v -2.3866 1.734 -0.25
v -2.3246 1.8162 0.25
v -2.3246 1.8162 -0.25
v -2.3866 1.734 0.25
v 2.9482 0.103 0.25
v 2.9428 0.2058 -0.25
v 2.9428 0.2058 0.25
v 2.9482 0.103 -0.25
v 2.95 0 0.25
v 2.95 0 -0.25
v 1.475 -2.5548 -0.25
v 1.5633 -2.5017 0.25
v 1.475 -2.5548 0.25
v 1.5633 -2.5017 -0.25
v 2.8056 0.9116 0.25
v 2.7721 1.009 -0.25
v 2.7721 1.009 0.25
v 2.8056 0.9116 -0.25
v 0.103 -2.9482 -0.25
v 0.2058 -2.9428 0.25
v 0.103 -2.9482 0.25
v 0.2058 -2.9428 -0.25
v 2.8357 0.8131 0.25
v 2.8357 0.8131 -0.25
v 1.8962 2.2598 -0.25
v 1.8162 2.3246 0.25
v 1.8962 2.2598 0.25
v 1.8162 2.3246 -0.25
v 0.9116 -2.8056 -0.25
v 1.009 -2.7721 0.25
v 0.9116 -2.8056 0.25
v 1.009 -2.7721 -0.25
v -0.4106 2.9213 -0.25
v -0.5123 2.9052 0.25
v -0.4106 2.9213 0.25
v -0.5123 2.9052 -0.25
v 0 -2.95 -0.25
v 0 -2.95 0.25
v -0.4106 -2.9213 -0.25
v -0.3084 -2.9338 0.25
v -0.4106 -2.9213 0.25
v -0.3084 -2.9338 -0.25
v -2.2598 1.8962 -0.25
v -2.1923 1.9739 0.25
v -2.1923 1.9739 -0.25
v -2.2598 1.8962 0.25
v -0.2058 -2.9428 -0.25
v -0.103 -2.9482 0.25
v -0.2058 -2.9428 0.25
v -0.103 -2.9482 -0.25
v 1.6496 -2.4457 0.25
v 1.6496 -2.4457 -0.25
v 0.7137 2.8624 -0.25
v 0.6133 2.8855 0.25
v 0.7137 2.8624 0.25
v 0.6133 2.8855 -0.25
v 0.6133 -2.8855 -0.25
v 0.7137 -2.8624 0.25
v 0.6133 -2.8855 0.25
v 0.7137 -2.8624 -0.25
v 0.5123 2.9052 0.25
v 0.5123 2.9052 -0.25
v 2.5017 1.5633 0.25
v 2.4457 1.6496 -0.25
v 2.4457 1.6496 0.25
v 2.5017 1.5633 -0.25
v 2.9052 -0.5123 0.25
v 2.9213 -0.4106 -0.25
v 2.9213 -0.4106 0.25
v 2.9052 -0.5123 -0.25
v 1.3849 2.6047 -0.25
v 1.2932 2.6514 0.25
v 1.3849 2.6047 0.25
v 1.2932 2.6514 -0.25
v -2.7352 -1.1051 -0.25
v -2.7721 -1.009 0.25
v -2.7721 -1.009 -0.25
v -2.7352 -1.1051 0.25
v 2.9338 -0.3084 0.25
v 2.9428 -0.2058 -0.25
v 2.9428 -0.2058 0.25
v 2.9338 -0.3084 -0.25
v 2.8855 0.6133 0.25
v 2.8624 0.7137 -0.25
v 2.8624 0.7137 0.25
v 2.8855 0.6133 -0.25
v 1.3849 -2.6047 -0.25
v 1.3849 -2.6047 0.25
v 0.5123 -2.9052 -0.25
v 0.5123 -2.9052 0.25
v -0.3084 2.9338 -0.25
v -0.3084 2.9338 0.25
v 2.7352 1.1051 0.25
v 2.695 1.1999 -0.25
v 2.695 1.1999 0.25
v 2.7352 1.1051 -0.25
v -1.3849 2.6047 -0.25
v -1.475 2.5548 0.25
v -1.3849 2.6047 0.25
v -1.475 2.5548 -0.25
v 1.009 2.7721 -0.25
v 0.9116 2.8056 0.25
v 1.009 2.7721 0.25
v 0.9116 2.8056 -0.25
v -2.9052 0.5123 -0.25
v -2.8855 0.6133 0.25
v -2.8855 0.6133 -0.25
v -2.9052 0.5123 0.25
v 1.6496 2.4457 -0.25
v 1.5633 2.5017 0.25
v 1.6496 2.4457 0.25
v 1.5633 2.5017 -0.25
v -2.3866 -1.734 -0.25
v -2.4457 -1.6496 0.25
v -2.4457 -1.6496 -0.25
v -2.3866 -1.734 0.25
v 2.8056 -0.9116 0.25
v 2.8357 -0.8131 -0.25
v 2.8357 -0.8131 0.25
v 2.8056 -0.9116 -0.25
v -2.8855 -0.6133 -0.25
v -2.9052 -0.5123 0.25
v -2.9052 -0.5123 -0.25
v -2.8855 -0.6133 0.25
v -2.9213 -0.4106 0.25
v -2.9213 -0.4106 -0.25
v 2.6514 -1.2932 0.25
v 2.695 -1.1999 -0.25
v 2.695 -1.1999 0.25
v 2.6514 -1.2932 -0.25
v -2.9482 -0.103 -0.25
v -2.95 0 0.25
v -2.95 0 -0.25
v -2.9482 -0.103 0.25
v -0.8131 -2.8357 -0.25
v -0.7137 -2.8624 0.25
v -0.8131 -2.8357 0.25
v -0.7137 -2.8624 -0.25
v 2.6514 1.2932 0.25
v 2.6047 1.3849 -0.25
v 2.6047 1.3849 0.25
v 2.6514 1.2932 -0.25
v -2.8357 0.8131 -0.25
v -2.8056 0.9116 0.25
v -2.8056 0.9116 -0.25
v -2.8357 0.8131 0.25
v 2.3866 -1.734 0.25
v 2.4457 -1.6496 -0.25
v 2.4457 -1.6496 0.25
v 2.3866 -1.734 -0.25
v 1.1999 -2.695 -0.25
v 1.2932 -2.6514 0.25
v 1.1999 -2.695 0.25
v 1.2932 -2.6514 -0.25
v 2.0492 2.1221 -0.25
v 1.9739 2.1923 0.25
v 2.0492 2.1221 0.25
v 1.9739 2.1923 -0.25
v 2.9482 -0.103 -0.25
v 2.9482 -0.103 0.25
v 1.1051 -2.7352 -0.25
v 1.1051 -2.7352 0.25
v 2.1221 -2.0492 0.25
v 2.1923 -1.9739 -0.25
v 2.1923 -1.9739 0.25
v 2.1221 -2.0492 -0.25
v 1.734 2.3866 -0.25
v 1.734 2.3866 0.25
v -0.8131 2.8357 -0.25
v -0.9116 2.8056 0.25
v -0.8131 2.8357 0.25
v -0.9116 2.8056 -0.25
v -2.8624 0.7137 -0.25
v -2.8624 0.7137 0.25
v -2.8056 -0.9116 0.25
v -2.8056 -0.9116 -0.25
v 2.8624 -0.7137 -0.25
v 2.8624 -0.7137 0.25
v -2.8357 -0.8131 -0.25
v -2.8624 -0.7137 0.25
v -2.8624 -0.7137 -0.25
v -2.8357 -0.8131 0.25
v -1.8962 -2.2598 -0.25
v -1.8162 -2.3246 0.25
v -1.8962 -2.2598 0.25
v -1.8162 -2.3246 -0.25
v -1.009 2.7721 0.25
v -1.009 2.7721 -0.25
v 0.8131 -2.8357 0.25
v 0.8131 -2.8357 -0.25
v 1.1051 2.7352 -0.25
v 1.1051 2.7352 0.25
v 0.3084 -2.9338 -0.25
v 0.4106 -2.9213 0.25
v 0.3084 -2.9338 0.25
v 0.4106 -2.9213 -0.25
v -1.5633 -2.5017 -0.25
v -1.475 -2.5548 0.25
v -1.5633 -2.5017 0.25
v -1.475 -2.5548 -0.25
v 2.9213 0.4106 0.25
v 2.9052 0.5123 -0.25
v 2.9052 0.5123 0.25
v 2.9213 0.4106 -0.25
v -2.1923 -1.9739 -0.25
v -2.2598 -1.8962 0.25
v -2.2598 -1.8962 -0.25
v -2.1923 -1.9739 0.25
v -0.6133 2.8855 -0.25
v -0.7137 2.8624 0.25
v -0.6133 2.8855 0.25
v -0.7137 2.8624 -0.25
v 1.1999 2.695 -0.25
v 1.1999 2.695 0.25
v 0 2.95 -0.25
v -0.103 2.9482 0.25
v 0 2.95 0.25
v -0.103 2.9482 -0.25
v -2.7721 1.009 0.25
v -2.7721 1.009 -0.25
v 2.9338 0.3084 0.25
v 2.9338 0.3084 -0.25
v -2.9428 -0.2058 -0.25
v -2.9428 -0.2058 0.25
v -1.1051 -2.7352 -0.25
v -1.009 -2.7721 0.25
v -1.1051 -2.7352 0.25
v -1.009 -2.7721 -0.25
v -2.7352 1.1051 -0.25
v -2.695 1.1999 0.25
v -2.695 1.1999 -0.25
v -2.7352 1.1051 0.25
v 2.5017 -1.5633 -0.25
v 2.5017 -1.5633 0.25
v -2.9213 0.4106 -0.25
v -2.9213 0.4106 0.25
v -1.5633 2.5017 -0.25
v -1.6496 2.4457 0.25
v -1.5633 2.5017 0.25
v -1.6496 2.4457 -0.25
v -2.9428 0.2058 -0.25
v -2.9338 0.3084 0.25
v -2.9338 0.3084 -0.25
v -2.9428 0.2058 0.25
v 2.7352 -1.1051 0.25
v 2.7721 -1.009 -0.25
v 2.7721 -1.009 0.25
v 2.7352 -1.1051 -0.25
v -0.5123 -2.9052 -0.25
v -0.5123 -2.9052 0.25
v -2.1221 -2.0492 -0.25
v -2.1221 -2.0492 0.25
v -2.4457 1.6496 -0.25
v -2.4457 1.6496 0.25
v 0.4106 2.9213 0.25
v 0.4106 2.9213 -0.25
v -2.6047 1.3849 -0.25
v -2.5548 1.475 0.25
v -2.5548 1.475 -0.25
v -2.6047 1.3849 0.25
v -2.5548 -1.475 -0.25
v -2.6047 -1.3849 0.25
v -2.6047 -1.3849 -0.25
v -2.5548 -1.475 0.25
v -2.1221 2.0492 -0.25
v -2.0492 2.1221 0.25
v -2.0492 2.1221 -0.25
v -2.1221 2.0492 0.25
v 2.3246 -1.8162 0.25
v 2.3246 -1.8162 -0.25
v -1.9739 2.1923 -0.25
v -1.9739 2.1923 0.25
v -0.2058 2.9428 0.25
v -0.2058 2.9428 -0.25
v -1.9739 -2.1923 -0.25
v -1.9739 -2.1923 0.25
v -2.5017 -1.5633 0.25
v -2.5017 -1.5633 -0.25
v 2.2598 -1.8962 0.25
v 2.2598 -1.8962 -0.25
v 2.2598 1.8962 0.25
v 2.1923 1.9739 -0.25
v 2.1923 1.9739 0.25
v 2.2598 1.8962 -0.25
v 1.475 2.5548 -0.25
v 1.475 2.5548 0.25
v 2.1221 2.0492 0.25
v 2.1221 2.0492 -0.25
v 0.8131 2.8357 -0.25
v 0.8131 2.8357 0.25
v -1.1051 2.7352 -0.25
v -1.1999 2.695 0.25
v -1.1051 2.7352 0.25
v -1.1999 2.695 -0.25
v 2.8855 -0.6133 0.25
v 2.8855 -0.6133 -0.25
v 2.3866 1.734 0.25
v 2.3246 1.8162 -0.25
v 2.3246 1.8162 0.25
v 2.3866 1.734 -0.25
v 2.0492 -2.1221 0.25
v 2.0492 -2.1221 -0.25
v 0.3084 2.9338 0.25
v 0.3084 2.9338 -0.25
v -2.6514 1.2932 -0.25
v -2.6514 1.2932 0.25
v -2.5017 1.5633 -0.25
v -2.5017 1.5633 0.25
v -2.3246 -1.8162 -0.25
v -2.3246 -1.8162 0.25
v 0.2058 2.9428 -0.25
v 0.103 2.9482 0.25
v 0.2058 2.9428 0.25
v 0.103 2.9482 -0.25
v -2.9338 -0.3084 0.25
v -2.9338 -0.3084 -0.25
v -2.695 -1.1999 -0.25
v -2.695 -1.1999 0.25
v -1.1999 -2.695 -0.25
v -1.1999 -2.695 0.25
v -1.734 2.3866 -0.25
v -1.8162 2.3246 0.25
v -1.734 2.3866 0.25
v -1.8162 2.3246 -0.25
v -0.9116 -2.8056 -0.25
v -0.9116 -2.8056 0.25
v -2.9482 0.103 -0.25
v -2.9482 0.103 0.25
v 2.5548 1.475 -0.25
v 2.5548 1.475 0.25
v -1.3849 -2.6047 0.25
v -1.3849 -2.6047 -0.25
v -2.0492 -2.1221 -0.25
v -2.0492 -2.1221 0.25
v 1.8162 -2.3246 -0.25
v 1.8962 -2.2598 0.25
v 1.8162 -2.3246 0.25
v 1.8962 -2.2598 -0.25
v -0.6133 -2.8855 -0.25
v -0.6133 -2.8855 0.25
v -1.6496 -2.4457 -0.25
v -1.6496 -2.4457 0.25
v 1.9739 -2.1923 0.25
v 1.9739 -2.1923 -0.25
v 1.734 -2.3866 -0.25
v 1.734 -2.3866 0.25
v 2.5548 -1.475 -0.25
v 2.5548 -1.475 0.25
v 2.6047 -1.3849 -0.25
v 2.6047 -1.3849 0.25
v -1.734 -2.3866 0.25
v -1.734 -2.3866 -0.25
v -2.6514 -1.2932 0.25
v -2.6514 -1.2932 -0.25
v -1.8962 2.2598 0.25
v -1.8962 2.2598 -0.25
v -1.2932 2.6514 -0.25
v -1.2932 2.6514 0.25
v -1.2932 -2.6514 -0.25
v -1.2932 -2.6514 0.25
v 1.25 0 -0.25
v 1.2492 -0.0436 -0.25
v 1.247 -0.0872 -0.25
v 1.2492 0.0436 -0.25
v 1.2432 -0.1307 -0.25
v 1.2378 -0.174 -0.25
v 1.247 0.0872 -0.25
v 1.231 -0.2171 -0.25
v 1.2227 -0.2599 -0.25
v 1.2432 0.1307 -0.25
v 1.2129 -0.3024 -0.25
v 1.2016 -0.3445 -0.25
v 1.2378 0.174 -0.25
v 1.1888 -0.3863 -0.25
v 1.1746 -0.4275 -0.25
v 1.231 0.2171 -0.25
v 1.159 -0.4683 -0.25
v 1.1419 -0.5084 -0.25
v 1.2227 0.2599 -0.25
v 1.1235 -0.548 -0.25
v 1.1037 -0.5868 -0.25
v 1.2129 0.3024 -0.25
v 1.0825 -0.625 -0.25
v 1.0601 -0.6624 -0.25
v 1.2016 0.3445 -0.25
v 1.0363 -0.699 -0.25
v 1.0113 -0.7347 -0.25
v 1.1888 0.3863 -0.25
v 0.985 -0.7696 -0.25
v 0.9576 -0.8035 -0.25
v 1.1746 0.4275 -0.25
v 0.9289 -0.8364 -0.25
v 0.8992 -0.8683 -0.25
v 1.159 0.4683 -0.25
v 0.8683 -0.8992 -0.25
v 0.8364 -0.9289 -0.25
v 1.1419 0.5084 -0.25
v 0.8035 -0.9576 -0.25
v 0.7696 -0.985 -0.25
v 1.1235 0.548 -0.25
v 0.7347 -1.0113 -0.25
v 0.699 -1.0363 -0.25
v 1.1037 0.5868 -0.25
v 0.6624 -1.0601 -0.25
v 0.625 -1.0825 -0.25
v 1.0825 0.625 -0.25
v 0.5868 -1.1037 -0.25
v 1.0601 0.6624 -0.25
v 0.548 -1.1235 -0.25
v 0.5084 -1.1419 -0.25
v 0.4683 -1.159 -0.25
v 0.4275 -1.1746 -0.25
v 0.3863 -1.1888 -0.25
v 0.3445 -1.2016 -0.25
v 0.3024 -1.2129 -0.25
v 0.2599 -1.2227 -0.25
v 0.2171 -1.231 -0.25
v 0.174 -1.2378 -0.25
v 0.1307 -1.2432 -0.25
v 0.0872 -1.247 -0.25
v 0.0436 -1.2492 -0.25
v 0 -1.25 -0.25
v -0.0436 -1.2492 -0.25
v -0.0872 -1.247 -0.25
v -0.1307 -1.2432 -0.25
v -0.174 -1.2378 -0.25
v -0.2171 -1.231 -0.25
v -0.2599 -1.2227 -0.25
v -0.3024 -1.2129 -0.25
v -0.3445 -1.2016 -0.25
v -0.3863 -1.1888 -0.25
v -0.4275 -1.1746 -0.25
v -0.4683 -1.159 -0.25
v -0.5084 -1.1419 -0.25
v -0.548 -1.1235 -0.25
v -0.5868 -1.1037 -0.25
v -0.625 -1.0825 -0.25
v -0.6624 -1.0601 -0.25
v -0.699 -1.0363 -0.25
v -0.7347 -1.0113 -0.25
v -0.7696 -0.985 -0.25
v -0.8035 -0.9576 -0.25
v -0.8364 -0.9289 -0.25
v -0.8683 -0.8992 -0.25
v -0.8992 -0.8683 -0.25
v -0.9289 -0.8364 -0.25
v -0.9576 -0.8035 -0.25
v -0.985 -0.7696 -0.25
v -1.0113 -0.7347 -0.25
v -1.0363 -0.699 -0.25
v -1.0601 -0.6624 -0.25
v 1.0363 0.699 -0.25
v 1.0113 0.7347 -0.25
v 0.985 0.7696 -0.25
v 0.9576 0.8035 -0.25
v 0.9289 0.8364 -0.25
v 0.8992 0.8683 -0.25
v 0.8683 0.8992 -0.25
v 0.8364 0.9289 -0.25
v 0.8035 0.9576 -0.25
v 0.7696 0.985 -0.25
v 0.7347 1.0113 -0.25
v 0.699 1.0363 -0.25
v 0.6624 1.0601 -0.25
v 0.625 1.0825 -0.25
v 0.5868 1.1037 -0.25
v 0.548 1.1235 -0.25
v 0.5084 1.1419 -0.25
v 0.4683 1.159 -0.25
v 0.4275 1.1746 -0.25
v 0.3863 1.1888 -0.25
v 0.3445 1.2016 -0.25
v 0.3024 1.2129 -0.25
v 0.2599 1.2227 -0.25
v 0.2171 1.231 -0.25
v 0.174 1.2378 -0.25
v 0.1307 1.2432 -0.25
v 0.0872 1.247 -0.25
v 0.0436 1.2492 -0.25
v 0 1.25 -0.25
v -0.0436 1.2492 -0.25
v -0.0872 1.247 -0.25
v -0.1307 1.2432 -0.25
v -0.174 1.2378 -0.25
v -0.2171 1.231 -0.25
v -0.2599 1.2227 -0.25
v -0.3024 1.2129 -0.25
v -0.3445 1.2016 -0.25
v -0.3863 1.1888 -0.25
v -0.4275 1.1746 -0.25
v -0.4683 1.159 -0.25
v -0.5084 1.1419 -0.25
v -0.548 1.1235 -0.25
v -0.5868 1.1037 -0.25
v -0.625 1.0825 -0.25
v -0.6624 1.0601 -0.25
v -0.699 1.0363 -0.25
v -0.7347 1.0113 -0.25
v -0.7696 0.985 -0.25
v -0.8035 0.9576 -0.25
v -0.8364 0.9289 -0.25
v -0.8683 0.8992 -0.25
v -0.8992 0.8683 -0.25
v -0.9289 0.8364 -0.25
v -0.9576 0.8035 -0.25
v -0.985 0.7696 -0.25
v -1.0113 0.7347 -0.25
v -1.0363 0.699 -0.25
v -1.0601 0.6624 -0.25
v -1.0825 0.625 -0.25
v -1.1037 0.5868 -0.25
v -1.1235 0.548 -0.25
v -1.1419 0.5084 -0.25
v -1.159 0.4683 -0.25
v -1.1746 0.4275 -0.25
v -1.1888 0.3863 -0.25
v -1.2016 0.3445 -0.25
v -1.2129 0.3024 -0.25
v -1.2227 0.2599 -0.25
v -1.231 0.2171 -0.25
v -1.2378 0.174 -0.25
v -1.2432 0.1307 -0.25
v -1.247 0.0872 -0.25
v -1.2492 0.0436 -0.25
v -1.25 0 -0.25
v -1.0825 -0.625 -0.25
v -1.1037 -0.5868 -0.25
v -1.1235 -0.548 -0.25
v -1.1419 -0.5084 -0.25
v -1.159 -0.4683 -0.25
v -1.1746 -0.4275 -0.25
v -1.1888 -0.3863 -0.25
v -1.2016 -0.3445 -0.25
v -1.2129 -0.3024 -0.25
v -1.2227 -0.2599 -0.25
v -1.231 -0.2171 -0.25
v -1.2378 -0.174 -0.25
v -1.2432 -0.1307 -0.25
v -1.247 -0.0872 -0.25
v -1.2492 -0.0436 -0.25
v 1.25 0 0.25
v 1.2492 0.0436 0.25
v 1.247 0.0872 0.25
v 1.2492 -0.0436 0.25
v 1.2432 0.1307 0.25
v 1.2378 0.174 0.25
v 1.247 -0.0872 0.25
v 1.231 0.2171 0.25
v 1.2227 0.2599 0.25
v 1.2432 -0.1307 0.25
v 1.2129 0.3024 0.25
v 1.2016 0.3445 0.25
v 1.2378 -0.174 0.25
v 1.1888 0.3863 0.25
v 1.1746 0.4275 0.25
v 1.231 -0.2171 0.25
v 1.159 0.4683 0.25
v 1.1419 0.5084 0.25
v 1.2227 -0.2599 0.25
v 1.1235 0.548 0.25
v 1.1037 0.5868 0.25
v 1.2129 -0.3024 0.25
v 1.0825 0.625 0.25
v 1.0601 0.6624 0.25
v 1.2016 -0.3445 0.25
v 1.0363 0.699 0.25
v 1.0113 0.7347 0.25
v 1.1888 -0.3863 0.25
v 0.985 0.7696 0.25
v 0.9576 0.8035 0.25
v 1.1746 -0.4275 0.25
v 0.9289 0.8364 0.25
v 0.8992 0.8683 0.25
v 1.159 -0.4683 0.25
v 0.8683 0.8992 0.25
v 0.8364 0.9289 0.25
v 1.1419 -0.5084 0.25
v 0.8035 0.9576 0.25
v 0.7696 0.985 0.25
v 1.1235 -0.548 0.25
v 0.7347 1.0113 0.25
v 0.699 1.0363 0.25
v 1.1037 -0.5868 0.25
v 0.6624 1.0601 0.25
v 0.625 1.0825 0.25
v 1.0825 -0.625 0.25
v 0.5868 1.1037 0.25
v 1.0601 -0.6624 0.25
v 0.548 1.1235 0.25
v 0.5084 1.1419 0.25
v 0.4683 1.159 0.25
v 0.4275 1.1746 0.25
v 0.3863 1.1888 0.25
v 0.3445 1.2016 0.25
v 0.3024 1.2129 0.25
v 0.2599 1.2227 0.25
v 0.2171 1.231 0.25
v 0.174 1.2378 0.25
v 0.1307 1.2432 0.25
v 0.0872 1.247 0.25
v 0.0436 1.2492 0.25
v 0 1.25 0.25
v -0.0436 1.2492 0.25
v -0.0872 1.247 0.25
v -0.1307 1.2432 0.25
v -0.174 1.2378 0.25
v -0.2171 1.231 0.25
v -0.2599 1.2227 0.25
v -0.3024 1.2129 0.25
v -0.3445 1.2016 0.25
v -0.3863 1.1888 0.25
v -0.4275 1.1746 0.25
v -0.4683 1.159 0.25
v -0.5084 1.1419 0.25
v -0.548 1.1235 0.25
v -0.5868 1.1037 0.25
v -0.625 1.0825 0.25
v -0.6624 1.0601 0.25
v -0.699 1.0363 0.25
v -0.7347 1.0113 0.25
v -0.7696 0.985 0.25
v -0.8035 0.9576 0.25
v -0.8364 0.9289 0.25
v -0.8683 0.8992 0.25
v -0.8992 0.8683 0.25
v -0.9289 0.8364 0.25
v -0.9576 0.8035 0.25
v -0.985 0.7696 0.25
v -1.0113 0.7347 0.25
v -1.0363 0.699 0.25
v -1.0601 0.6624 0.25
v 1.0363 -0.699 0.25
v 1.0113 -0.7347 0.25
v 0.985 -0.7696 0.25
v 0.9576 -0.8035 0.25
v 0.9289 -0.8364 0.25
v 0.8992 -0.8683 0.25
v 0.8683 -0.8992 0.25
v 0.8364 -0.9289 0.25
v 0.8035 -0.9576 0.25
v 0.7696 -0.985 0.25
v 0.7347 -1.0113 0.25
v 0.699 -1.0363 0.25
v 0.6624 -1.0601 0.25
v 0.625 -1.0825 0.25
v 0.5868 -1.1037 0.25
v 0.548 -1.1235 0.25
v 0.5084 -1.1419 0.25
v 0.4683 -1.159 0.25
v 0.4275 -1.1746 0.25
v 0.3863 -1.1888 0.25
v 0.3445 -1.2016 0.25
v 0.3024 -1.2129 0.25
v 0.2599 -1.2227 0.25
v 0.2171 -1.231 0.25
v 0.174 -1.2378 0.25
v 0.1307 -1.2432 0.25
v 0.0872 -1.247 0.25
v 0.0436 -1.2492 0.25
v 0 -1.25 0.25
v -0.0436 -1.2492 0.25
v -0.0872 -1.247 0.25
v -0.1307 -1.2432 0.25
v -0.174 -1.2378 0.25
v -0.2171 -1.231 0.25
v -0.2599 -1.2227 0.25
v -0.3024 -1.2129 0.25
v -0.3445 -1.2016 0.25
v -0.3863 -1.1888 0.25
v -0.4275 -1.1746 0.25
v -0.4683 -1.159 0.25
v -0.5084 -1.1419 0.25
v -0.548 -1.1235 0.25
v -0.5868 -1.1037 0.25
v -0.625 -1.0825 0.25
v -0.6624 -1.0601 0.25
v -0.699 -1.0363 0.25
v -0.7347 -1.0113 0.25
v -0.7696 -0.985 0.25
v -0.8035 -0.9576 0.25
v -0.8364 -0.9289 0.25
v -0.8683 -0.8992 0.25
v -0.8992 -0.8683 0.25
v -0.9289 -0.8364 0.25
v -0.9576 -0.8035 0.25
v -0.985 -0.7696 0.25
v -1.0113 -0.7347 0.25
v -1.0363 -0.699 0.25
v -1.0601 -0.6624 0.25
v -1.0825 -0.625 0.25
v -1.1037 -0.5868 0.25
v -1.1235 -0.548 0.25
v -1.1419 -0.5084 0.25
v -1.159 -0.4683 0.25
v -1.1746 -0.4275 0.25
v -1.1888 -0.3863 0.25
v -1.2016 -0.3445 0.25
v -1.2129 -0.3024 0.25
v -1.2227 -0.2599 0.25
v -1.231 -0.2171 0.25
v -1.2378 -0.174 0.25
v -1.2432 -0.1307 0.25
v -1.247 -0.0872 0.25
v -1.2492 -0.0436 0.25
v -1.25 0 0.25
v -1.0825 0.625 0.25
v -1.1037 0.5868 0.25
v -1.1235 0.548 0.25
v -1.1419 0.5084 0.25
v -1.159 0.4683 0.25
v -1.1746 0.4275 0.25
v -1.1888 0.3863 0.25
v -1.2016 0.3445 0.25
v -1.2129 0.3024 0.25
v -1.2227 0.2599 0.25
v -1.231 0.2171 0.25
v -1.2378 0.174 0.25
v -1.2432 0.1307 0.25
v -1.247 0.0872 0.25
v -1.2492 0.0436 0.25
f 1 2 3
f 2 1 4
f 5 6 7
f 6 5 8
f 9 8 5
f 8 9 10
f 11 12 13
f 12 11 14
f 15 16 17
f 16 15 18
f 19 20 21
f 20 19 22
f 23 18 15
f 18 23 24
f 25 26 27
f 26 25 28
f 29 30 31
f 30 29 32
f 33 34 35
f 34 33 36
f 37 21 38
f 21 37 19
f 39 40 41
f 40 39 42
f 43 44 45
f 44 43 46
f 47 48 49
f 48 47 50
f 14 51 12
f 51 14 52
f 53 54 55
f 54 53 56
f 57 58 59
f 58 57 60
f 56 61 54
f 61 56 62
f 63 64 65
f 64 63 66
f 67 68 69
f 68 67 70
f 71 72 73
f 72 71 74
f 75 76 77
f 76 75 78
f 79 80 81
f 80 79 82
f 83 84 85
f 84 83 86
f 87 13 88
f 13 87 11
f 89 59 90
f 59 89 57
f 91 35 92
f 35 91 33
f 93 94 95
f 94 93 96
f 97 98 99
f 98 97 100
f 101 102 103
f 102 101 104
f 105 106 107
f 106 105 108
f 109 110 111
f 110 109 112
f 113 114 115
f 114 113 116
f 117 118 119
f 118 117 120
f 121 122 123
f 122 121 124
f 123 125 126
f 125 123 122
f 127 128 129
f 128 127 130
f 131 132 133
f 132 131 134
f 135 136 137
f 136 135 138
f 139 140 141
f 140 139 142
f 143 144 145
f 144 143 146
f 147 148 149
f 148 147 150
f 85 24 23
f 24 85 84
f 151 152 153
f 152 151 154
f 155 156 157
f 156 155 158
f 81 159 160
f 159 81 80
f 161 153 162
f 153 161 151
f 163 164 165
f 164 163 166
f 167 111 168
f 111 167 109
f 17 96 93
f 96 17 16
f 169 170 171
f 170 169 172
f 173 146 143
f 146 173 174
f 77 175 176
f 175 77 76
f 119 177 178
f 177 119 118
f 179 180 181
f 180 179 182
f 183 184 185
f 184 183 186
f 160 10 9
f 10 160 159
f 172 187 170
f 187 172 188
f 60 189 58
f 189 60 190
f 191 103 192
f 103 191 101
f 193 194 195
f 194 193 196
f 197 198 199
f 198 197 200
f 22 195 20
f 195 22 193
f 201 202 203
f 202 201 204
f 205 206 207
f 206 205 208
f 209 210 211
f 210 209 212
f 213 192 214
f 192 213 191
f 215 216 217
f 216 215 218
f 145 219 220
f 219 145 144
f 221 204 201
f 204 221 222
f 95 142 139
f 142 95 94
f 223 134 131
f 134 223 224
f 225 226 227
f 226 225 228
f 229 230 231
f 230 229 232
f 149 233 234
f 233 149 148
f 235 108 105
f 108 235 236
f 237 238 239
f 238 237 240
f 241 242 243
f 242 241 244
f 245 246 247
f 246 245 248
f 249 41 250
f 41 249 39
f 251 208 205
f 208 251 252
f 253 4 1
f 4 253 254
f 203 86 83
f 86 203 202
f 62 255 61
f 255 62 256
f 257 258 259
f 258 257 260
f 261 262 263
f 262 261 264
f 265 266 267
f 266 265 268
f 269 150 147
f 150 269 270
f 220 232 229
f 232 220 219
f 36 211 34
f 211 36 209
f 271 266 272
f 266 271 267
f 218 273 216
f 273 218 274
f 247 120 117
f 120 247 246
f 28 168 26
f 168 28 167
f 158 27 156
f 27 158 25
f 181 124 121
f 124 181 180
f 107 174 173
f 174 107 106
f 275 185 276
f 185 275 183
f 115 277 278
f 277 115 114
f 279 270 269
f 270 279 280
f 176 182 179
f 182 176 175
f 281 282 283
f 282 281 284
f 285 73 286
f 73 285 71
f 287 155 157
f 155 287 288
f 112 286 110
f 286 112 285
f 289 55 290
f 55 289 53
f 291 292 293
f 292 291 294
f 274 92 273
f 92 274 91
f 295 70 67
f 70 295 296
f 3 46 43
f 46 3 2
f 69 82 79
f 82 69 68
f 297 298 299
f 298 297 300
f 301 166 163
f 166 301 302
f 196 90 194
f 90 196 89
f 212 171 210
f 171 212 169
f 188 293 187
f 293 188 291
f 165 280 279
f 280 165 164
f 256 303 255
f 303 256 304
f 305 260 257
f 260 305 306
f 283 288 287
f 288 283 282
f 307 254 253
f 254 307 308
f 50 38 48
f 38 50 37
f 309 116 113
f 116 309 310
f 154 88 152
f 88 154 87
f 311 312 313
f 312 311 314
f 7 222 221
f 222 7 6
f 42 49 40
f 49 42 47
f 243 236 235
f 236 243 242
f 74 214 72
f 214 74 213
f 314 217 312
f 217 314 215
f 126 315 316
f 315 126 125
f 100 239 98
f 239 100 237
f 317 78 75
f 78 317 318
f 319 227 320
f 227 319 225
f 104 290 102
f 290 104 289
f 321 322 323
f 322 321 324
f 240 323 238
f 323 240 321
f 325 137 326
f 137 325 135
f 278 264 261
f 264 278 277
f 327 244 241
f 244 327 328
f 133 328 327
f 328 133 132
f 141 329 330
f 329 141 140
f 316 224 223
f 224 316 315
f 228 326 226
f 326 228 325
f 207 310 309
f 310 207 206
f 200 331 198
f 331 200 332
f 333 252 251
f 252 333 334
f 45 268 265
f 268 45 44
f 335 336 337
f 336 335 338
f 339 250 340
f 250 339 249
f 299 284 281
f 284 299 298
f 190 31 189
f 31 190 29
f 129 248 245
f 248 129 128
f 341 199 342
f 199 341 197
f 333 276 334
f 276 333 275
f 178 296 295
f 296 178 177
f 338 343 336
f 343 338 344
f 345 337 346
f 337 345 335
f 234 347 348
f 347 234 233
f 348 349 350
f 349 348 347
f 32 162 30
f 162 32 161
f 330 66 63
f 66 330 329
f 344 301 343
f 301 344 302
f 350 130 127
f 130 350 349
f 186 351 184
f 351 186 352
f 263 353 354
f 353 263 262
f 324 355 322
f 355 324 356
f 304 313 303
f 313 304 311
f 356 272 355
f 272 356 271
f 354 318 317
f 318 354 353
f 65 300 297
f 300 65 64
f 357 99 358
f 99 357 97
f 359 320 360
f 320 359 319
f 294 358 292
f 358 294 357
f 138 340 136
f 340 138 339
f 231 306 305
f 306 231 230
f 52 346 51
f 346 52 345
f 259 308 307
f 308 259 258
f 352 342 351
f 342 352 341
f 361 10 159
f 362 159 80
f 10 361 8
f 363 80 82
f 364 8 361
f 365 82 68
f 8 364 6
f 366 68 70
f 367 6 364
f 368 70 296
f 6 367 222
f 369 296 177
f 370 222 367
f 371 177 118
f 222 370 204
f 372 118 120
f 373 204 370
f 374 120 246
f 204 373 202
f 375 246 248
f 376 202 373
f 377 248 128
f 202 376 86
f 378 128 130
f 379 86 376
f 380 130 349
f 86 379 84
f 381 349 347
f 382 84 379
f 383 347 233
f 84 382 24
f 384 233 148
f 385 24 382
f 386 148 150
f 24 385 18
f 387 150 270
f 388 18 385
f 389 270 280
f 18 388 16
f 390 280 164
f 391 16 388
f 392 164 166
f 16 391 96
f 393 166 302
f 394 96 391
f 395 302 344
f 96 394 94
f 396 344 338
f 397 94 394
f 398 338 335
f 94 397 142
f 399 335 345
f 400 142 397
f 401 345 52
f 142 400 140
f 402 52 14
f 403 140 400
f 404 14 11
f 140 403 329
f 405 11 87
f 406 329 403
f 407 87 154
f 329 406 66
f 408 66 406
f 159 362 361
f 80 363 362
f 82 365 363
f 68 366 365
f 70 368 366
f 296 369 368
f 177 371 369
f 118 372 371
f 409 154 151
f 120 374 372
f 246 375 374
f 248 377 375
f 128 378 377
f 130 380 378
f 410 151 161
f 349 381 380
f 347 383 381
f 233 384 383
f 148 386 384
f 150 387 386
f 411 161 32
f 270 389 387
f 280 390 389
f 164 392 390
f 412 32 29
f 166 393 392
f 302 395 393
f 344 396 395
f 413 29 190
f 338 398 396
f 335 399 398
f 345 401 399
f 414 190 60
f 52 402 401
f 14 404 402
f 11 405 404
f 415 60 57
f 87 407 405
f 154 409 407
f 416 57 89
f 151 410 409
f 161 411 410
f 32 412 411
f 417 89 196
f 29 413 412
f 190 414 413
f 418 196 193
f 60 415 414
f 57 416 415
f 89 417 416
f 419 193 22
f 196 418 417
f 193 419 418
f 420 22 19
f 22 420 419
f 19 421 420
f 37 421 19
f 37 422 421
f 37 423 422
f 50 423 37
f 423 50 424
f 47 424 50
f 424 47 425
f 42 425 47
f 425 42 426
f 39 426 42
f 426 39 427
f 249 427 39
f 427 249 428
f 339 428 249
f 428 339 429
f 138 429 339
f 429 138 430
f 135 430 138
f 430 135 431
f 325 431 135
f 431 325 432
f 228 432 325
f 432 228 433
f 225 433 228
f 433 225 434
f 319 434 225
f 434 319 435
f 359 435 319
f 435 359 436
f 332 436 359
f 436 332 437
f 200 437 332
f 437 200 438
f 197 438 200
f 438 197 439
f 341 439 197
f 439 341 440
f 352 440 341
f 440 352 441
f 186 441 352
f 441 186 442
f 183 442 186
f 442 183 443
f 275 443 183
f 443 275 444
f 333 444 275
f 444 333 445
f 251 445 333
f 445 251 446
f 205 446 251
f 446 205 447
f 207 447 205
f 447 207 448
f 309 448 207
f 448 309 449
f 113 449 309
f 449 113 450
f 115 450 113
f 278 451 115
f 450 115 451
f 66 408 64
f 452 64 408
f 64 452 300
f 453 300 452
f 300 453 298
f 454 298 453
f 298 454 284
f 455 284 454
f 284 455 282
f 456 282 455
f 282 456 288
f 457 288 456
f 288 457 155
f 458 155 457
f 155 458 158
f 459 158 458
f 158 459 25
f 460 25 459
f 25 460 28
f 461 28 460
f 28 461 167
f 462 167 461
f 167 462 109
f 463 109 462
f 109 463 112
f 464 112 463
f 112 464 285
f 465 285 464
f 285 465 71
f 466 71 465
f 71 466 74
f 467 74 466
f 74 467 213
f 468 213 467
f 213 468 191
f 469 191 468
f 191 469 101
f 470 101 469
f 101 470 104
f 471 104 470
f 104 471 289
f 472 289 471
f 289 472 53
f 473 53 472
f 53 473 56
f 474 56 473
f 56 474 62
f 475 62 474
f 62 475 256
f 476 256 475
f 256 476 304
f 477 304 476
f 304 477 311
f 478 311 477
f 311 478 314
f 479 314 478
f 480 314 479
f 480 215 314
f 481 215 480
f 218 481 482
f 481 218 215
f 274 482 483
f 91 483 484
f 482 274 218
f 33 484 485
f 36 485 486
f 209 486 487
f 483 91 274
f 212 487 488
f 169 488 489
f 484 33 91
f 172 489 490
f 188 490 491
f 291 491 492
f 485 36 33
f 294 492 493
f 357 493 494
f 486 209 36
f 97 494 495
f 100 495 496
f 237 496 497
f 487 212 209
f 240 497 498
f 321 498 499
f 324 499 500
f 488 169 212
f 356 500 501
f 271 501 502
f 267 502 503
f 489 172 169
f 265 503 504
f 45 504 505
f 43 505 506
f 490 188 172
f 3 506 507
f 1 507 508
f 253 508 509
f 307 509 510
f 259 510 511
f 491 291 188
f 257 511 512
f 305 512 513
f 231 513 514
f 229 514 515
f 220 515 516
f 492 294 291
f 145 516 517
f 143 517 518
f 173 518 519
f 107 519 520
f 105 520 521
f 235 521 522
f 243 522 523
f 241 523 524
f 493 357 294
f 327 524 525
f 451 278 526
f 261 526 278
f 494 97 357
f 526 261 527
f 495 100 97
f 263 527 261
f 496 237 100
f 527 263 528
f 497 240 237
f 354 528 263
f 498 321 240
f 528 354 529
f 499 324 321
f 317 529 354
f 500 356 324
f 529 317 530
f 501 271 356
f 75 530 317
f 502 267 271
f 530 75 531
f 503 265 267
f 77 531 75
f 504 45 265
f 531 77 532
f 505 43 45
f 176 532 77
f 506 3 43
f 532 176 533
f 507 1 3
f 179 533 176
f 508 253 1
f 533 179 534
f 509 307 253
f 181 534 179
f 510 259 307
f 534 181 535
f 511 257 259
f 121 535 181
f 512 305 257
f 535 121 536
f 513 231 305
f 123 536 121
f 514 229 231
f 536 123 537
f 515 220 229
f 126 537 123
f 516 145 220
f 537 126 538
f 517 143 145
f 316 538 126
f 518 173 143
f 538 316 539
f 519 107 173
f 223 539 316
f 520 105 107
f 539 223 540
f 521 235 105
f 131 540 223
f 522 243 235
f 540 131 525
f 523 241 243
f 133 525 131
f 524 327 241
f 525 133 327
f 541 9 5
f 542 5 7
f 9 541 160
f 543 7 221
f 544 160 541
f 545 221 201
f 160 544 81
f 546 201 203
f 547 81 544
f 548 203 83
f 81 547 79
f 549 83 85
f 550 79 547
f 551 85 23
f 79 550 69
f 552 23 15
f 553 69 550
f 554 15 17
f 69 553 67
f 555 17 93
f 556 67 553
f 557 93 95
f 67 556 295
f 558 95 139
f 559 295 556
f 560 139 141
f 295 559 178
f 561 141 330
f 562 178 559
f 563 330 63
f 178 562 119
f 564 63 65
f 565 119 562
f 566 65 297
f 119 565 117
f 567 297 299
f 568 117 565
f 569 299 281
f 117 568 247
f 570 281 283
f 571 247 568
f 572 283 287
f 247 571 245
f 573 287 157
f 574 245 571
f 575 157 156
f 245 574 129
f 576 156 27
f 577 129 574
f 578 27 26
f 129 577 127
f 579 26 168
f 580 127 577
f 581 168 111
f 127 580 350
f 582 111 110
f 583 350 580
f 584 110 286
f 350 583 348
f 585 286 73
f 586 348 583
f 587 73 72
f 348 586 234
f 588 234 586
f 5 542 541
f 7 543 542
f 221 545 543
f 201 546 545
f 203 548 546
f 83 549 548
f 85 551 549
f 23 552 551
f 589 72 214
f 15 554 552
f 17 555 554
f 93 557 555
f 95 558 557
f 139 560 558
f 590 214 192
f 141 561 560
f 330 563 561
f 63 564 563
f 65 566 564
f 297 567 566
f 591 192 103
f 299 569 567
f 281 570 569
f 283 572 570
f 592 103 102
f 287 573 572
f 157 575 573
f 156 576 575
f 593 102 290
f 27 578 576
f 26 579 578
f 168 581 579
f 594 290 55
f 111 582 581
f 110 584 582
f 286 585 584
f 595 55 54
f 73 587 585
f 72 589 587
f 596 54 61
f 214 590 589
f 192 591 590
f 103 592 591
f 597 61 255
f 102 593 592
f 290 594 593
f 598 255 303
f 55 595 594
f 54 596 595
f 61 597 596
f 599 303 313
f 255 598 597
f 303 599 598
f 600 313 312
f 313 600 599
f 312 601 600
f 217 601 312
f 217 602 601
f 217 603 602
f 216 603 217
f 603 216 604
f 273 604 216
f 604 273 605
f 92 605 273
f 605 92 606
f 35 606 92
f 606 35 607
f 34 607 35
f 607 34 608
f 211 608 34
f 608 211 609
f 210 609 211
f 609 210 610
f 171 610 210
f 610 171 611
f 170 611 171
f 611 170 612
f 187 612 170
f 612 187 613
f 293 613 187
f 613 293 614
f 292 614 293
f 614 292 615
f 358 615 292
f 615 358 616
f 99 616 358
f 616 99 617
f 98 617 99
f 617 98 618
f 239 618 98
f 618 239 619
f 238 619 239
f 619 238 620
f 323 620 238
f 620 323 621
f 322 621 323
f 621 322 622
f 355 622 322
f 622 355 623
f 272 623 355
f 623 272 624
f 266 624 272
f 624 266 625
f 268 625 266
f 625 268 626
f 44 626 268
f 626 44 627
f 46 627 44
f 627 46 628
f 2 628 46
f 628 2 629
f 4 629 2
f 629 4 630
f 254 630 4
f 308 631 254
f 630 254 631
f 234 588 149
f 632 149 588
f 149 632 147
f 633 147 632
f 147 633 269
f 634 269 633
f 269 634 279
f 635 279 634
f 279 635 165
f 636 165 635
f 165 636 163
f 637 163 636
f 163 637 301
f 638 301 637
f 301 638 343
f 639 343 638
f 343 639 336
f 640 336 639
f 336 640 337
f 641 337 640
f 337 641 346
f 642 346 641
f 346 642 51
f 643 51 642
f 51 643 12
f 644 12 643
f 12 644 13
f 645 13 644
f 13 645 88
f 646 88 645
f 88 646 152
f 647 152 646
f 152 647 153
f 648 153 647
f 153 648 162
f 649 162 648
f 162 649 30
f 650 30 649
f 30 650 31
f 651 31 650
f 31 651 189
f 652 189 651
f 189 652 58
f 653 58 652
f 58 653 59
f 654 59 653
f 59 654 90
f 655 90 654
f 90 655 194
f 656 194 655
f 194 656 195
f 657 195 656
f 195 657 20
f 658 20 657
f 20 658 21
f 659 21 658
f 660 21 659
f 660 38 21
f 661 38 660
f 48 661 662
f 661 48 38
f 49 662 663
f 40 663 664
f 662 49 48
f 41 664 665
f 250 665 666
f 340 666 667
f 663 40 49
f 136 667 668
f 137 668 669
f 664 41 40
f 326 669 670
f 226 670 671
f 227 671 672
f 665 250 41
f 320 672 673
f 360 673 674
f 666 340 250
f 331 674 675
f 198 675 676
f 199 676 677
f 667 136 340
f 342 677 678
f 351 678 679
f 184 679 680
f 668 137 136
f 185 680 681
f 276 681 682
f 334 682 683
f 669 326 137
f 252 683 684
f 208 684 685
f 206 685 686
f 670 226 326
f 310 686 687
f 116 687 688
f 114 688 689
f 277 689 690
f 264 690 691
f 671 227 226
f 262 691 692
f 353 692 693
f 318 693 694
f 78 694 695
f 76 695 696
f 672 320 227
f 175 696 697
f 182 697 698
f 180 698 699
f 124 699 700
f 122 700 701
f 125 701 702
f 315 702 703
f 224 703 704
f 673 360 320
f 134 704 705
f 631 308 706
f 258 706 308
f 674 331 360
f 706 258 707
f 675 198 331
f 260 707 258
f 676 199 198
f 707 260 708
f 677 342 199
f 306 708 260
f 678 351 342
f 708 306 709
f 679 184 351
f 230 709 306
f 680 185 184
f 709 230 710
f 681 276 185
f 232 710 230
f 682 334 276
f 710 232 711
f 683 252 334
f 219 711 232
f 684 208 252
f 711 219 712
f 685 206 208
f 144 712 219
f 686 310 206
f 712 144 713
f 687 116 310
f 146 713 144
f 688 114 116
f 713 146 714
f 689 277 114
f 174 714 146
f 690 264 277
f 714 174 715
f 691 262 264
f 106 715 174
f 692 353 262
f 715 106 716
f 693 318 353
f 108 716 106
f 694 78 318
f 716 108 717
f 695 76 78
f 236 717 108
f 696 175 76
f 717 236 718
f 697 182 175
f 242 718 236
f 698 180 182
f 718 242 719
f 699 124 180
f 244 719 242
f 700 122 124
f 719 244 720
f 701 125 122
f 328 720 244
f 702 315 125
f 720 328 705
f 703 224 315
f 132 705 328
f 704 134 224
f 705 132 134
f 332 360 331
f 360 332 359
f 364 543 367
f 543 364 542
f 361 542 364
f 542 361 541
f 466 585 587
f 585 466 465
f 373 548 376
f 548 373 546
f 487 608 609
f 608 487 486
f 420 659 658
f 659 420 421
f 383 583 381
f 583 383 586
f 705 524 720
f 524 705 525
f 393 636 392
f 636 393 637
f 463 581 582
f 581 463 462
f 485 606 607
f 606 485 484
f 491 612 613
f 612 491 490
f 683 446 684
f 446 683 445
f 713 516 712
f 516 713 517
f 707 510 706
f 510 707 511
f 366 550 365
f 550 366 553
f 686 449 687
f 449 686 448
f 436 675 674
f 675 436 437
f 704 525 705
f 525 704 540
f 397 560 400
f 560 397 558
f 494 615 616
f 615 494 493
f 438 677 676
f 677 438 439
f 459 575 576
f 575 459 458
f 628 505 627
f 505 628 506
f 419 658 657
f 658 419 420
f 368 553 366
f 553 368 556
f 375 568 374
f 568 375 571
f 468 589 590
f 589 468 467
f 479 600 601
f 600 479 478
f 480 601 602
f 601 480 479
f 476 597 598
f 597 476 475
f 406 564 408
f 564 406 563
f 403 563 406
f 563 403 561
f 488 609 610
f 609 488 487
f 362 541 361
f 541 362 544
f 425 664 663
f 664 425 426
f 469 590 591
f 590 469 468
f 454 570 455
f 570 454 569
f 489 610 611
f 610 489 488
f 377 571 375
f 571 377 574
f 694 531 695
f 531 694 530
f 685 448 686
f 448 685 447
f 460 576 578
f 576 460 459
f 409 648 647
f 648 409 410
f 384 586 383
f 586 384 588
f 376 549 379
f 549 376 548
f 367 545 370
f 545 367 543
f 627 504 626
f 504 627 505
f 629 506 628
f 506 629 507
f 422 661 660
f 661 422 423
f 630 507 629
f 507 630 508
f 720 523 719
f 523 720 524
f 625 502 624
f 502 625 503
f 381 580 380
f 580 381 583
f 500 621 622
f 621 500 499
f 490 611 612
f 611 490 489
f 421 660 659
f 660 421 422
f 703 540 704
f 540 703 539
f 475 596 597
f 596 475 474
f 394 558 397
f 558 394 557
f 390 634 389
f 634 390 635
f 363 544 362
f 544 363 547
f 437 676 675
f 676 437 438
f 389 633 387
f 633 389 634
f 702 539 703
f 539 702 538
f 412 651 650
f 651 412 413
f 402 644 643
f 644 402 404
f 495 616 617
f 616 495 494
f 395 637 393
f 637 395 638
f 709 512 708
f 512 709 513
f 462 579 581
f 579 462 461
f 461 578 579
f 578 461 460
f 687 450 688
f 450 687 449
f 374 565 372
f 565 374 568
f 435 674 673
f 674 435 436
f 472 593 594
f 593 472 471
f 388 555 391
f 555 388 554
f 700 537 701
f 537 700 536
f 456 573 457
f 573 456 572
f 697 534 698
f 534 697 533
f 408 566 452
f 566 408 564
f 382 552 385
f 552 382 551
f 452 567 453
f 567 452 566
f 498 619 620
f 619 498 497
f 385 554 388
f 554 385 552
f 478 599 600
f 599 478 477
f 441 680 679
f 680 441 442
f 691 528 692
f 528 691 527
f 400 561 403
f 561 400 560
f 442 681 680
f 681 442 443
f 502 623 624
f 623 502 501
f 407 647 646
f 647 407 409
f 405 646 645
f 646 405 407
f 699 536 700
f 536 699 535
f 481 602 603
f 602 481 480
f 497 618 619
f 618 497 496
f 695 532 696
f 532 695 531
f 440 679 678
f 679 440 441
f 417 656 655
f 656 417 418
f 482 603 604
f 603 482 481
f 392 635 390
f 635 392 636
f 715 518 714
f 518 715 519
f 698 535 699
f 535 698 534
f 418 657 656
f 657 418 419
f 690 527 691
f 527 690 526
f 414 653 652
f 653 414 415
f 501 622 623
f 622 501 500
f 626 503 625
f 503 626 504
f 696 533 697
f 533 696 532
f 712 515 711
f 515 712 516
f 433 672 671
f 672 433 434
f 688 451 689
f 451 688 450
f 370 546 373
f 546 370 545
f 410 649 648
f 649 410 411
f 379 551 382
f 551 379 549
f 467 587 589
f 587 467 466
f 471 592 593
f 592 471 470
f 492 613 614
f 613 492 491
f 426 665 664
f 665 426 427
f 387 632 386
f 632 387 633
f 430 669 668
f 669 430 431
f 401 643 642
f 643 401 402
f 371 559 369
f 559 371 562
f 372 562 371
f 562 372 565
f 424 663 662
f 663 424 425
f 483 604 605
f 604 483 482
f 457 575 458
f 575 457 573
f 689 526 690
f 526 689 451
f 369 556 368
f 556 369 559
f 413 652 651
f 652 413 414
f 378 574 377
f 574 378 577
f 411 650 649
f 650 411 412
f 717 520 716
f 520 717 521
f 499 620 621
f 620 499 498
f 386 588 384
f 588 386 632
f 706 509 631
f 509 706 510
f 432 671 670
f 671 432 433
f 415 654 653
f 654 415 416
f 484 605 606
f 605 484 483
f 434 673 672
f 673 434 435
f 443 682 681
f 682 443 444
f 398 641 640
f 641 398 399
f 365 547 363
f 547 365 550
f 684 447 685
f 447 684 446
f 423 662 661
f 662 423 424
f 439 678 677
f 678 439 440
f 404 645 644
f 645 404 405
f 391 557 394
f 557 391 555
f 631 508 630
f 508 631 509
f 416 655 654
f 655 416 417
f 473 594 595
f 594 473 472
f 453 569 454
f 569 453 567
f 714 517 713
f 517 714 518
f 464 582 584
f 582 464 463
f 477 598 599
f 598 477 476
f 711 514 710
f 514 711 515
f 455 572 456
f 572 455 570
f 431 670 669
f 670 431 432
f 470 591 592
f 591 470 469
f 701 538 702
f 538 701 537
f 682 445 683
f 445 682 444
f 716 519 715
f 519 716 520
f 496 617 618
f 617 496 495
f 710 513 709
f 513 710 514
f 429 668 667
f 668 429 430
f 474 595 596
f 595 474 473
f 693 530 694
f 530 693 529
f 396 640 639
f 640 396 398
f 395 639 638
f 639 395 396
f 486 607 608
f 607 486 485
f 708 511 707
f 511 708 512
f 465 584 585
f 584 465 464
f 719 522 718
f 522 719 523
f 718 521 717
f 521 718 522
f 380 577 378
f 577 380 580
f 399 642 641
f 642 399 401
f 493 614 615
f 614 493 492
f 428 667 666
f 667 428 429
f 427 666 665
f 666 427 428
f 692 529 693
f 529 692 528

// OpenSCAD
// Flat washer: 2.5mm ID, 5.9mm OD, 0.5mm thickness

outer_diameter = 5.9;   //[3:12:0.1]
inner_diameter = 2.5;   //[1.2:6:0.1]
thickness      = 0.5;   //[0.25:2:0.05]

// Ensure smooth circular profiles (fix polygonal look)
$fn = 180;

// Small extra height so the hole is guaranteed through
hole_extra = 0.2;

difference() {
    cylinder(d=outer_diameter, h=thickness, center=true);
    cylinder(d=inner_diameter, h=thickness + 2*hole_extra, center=true);
}
